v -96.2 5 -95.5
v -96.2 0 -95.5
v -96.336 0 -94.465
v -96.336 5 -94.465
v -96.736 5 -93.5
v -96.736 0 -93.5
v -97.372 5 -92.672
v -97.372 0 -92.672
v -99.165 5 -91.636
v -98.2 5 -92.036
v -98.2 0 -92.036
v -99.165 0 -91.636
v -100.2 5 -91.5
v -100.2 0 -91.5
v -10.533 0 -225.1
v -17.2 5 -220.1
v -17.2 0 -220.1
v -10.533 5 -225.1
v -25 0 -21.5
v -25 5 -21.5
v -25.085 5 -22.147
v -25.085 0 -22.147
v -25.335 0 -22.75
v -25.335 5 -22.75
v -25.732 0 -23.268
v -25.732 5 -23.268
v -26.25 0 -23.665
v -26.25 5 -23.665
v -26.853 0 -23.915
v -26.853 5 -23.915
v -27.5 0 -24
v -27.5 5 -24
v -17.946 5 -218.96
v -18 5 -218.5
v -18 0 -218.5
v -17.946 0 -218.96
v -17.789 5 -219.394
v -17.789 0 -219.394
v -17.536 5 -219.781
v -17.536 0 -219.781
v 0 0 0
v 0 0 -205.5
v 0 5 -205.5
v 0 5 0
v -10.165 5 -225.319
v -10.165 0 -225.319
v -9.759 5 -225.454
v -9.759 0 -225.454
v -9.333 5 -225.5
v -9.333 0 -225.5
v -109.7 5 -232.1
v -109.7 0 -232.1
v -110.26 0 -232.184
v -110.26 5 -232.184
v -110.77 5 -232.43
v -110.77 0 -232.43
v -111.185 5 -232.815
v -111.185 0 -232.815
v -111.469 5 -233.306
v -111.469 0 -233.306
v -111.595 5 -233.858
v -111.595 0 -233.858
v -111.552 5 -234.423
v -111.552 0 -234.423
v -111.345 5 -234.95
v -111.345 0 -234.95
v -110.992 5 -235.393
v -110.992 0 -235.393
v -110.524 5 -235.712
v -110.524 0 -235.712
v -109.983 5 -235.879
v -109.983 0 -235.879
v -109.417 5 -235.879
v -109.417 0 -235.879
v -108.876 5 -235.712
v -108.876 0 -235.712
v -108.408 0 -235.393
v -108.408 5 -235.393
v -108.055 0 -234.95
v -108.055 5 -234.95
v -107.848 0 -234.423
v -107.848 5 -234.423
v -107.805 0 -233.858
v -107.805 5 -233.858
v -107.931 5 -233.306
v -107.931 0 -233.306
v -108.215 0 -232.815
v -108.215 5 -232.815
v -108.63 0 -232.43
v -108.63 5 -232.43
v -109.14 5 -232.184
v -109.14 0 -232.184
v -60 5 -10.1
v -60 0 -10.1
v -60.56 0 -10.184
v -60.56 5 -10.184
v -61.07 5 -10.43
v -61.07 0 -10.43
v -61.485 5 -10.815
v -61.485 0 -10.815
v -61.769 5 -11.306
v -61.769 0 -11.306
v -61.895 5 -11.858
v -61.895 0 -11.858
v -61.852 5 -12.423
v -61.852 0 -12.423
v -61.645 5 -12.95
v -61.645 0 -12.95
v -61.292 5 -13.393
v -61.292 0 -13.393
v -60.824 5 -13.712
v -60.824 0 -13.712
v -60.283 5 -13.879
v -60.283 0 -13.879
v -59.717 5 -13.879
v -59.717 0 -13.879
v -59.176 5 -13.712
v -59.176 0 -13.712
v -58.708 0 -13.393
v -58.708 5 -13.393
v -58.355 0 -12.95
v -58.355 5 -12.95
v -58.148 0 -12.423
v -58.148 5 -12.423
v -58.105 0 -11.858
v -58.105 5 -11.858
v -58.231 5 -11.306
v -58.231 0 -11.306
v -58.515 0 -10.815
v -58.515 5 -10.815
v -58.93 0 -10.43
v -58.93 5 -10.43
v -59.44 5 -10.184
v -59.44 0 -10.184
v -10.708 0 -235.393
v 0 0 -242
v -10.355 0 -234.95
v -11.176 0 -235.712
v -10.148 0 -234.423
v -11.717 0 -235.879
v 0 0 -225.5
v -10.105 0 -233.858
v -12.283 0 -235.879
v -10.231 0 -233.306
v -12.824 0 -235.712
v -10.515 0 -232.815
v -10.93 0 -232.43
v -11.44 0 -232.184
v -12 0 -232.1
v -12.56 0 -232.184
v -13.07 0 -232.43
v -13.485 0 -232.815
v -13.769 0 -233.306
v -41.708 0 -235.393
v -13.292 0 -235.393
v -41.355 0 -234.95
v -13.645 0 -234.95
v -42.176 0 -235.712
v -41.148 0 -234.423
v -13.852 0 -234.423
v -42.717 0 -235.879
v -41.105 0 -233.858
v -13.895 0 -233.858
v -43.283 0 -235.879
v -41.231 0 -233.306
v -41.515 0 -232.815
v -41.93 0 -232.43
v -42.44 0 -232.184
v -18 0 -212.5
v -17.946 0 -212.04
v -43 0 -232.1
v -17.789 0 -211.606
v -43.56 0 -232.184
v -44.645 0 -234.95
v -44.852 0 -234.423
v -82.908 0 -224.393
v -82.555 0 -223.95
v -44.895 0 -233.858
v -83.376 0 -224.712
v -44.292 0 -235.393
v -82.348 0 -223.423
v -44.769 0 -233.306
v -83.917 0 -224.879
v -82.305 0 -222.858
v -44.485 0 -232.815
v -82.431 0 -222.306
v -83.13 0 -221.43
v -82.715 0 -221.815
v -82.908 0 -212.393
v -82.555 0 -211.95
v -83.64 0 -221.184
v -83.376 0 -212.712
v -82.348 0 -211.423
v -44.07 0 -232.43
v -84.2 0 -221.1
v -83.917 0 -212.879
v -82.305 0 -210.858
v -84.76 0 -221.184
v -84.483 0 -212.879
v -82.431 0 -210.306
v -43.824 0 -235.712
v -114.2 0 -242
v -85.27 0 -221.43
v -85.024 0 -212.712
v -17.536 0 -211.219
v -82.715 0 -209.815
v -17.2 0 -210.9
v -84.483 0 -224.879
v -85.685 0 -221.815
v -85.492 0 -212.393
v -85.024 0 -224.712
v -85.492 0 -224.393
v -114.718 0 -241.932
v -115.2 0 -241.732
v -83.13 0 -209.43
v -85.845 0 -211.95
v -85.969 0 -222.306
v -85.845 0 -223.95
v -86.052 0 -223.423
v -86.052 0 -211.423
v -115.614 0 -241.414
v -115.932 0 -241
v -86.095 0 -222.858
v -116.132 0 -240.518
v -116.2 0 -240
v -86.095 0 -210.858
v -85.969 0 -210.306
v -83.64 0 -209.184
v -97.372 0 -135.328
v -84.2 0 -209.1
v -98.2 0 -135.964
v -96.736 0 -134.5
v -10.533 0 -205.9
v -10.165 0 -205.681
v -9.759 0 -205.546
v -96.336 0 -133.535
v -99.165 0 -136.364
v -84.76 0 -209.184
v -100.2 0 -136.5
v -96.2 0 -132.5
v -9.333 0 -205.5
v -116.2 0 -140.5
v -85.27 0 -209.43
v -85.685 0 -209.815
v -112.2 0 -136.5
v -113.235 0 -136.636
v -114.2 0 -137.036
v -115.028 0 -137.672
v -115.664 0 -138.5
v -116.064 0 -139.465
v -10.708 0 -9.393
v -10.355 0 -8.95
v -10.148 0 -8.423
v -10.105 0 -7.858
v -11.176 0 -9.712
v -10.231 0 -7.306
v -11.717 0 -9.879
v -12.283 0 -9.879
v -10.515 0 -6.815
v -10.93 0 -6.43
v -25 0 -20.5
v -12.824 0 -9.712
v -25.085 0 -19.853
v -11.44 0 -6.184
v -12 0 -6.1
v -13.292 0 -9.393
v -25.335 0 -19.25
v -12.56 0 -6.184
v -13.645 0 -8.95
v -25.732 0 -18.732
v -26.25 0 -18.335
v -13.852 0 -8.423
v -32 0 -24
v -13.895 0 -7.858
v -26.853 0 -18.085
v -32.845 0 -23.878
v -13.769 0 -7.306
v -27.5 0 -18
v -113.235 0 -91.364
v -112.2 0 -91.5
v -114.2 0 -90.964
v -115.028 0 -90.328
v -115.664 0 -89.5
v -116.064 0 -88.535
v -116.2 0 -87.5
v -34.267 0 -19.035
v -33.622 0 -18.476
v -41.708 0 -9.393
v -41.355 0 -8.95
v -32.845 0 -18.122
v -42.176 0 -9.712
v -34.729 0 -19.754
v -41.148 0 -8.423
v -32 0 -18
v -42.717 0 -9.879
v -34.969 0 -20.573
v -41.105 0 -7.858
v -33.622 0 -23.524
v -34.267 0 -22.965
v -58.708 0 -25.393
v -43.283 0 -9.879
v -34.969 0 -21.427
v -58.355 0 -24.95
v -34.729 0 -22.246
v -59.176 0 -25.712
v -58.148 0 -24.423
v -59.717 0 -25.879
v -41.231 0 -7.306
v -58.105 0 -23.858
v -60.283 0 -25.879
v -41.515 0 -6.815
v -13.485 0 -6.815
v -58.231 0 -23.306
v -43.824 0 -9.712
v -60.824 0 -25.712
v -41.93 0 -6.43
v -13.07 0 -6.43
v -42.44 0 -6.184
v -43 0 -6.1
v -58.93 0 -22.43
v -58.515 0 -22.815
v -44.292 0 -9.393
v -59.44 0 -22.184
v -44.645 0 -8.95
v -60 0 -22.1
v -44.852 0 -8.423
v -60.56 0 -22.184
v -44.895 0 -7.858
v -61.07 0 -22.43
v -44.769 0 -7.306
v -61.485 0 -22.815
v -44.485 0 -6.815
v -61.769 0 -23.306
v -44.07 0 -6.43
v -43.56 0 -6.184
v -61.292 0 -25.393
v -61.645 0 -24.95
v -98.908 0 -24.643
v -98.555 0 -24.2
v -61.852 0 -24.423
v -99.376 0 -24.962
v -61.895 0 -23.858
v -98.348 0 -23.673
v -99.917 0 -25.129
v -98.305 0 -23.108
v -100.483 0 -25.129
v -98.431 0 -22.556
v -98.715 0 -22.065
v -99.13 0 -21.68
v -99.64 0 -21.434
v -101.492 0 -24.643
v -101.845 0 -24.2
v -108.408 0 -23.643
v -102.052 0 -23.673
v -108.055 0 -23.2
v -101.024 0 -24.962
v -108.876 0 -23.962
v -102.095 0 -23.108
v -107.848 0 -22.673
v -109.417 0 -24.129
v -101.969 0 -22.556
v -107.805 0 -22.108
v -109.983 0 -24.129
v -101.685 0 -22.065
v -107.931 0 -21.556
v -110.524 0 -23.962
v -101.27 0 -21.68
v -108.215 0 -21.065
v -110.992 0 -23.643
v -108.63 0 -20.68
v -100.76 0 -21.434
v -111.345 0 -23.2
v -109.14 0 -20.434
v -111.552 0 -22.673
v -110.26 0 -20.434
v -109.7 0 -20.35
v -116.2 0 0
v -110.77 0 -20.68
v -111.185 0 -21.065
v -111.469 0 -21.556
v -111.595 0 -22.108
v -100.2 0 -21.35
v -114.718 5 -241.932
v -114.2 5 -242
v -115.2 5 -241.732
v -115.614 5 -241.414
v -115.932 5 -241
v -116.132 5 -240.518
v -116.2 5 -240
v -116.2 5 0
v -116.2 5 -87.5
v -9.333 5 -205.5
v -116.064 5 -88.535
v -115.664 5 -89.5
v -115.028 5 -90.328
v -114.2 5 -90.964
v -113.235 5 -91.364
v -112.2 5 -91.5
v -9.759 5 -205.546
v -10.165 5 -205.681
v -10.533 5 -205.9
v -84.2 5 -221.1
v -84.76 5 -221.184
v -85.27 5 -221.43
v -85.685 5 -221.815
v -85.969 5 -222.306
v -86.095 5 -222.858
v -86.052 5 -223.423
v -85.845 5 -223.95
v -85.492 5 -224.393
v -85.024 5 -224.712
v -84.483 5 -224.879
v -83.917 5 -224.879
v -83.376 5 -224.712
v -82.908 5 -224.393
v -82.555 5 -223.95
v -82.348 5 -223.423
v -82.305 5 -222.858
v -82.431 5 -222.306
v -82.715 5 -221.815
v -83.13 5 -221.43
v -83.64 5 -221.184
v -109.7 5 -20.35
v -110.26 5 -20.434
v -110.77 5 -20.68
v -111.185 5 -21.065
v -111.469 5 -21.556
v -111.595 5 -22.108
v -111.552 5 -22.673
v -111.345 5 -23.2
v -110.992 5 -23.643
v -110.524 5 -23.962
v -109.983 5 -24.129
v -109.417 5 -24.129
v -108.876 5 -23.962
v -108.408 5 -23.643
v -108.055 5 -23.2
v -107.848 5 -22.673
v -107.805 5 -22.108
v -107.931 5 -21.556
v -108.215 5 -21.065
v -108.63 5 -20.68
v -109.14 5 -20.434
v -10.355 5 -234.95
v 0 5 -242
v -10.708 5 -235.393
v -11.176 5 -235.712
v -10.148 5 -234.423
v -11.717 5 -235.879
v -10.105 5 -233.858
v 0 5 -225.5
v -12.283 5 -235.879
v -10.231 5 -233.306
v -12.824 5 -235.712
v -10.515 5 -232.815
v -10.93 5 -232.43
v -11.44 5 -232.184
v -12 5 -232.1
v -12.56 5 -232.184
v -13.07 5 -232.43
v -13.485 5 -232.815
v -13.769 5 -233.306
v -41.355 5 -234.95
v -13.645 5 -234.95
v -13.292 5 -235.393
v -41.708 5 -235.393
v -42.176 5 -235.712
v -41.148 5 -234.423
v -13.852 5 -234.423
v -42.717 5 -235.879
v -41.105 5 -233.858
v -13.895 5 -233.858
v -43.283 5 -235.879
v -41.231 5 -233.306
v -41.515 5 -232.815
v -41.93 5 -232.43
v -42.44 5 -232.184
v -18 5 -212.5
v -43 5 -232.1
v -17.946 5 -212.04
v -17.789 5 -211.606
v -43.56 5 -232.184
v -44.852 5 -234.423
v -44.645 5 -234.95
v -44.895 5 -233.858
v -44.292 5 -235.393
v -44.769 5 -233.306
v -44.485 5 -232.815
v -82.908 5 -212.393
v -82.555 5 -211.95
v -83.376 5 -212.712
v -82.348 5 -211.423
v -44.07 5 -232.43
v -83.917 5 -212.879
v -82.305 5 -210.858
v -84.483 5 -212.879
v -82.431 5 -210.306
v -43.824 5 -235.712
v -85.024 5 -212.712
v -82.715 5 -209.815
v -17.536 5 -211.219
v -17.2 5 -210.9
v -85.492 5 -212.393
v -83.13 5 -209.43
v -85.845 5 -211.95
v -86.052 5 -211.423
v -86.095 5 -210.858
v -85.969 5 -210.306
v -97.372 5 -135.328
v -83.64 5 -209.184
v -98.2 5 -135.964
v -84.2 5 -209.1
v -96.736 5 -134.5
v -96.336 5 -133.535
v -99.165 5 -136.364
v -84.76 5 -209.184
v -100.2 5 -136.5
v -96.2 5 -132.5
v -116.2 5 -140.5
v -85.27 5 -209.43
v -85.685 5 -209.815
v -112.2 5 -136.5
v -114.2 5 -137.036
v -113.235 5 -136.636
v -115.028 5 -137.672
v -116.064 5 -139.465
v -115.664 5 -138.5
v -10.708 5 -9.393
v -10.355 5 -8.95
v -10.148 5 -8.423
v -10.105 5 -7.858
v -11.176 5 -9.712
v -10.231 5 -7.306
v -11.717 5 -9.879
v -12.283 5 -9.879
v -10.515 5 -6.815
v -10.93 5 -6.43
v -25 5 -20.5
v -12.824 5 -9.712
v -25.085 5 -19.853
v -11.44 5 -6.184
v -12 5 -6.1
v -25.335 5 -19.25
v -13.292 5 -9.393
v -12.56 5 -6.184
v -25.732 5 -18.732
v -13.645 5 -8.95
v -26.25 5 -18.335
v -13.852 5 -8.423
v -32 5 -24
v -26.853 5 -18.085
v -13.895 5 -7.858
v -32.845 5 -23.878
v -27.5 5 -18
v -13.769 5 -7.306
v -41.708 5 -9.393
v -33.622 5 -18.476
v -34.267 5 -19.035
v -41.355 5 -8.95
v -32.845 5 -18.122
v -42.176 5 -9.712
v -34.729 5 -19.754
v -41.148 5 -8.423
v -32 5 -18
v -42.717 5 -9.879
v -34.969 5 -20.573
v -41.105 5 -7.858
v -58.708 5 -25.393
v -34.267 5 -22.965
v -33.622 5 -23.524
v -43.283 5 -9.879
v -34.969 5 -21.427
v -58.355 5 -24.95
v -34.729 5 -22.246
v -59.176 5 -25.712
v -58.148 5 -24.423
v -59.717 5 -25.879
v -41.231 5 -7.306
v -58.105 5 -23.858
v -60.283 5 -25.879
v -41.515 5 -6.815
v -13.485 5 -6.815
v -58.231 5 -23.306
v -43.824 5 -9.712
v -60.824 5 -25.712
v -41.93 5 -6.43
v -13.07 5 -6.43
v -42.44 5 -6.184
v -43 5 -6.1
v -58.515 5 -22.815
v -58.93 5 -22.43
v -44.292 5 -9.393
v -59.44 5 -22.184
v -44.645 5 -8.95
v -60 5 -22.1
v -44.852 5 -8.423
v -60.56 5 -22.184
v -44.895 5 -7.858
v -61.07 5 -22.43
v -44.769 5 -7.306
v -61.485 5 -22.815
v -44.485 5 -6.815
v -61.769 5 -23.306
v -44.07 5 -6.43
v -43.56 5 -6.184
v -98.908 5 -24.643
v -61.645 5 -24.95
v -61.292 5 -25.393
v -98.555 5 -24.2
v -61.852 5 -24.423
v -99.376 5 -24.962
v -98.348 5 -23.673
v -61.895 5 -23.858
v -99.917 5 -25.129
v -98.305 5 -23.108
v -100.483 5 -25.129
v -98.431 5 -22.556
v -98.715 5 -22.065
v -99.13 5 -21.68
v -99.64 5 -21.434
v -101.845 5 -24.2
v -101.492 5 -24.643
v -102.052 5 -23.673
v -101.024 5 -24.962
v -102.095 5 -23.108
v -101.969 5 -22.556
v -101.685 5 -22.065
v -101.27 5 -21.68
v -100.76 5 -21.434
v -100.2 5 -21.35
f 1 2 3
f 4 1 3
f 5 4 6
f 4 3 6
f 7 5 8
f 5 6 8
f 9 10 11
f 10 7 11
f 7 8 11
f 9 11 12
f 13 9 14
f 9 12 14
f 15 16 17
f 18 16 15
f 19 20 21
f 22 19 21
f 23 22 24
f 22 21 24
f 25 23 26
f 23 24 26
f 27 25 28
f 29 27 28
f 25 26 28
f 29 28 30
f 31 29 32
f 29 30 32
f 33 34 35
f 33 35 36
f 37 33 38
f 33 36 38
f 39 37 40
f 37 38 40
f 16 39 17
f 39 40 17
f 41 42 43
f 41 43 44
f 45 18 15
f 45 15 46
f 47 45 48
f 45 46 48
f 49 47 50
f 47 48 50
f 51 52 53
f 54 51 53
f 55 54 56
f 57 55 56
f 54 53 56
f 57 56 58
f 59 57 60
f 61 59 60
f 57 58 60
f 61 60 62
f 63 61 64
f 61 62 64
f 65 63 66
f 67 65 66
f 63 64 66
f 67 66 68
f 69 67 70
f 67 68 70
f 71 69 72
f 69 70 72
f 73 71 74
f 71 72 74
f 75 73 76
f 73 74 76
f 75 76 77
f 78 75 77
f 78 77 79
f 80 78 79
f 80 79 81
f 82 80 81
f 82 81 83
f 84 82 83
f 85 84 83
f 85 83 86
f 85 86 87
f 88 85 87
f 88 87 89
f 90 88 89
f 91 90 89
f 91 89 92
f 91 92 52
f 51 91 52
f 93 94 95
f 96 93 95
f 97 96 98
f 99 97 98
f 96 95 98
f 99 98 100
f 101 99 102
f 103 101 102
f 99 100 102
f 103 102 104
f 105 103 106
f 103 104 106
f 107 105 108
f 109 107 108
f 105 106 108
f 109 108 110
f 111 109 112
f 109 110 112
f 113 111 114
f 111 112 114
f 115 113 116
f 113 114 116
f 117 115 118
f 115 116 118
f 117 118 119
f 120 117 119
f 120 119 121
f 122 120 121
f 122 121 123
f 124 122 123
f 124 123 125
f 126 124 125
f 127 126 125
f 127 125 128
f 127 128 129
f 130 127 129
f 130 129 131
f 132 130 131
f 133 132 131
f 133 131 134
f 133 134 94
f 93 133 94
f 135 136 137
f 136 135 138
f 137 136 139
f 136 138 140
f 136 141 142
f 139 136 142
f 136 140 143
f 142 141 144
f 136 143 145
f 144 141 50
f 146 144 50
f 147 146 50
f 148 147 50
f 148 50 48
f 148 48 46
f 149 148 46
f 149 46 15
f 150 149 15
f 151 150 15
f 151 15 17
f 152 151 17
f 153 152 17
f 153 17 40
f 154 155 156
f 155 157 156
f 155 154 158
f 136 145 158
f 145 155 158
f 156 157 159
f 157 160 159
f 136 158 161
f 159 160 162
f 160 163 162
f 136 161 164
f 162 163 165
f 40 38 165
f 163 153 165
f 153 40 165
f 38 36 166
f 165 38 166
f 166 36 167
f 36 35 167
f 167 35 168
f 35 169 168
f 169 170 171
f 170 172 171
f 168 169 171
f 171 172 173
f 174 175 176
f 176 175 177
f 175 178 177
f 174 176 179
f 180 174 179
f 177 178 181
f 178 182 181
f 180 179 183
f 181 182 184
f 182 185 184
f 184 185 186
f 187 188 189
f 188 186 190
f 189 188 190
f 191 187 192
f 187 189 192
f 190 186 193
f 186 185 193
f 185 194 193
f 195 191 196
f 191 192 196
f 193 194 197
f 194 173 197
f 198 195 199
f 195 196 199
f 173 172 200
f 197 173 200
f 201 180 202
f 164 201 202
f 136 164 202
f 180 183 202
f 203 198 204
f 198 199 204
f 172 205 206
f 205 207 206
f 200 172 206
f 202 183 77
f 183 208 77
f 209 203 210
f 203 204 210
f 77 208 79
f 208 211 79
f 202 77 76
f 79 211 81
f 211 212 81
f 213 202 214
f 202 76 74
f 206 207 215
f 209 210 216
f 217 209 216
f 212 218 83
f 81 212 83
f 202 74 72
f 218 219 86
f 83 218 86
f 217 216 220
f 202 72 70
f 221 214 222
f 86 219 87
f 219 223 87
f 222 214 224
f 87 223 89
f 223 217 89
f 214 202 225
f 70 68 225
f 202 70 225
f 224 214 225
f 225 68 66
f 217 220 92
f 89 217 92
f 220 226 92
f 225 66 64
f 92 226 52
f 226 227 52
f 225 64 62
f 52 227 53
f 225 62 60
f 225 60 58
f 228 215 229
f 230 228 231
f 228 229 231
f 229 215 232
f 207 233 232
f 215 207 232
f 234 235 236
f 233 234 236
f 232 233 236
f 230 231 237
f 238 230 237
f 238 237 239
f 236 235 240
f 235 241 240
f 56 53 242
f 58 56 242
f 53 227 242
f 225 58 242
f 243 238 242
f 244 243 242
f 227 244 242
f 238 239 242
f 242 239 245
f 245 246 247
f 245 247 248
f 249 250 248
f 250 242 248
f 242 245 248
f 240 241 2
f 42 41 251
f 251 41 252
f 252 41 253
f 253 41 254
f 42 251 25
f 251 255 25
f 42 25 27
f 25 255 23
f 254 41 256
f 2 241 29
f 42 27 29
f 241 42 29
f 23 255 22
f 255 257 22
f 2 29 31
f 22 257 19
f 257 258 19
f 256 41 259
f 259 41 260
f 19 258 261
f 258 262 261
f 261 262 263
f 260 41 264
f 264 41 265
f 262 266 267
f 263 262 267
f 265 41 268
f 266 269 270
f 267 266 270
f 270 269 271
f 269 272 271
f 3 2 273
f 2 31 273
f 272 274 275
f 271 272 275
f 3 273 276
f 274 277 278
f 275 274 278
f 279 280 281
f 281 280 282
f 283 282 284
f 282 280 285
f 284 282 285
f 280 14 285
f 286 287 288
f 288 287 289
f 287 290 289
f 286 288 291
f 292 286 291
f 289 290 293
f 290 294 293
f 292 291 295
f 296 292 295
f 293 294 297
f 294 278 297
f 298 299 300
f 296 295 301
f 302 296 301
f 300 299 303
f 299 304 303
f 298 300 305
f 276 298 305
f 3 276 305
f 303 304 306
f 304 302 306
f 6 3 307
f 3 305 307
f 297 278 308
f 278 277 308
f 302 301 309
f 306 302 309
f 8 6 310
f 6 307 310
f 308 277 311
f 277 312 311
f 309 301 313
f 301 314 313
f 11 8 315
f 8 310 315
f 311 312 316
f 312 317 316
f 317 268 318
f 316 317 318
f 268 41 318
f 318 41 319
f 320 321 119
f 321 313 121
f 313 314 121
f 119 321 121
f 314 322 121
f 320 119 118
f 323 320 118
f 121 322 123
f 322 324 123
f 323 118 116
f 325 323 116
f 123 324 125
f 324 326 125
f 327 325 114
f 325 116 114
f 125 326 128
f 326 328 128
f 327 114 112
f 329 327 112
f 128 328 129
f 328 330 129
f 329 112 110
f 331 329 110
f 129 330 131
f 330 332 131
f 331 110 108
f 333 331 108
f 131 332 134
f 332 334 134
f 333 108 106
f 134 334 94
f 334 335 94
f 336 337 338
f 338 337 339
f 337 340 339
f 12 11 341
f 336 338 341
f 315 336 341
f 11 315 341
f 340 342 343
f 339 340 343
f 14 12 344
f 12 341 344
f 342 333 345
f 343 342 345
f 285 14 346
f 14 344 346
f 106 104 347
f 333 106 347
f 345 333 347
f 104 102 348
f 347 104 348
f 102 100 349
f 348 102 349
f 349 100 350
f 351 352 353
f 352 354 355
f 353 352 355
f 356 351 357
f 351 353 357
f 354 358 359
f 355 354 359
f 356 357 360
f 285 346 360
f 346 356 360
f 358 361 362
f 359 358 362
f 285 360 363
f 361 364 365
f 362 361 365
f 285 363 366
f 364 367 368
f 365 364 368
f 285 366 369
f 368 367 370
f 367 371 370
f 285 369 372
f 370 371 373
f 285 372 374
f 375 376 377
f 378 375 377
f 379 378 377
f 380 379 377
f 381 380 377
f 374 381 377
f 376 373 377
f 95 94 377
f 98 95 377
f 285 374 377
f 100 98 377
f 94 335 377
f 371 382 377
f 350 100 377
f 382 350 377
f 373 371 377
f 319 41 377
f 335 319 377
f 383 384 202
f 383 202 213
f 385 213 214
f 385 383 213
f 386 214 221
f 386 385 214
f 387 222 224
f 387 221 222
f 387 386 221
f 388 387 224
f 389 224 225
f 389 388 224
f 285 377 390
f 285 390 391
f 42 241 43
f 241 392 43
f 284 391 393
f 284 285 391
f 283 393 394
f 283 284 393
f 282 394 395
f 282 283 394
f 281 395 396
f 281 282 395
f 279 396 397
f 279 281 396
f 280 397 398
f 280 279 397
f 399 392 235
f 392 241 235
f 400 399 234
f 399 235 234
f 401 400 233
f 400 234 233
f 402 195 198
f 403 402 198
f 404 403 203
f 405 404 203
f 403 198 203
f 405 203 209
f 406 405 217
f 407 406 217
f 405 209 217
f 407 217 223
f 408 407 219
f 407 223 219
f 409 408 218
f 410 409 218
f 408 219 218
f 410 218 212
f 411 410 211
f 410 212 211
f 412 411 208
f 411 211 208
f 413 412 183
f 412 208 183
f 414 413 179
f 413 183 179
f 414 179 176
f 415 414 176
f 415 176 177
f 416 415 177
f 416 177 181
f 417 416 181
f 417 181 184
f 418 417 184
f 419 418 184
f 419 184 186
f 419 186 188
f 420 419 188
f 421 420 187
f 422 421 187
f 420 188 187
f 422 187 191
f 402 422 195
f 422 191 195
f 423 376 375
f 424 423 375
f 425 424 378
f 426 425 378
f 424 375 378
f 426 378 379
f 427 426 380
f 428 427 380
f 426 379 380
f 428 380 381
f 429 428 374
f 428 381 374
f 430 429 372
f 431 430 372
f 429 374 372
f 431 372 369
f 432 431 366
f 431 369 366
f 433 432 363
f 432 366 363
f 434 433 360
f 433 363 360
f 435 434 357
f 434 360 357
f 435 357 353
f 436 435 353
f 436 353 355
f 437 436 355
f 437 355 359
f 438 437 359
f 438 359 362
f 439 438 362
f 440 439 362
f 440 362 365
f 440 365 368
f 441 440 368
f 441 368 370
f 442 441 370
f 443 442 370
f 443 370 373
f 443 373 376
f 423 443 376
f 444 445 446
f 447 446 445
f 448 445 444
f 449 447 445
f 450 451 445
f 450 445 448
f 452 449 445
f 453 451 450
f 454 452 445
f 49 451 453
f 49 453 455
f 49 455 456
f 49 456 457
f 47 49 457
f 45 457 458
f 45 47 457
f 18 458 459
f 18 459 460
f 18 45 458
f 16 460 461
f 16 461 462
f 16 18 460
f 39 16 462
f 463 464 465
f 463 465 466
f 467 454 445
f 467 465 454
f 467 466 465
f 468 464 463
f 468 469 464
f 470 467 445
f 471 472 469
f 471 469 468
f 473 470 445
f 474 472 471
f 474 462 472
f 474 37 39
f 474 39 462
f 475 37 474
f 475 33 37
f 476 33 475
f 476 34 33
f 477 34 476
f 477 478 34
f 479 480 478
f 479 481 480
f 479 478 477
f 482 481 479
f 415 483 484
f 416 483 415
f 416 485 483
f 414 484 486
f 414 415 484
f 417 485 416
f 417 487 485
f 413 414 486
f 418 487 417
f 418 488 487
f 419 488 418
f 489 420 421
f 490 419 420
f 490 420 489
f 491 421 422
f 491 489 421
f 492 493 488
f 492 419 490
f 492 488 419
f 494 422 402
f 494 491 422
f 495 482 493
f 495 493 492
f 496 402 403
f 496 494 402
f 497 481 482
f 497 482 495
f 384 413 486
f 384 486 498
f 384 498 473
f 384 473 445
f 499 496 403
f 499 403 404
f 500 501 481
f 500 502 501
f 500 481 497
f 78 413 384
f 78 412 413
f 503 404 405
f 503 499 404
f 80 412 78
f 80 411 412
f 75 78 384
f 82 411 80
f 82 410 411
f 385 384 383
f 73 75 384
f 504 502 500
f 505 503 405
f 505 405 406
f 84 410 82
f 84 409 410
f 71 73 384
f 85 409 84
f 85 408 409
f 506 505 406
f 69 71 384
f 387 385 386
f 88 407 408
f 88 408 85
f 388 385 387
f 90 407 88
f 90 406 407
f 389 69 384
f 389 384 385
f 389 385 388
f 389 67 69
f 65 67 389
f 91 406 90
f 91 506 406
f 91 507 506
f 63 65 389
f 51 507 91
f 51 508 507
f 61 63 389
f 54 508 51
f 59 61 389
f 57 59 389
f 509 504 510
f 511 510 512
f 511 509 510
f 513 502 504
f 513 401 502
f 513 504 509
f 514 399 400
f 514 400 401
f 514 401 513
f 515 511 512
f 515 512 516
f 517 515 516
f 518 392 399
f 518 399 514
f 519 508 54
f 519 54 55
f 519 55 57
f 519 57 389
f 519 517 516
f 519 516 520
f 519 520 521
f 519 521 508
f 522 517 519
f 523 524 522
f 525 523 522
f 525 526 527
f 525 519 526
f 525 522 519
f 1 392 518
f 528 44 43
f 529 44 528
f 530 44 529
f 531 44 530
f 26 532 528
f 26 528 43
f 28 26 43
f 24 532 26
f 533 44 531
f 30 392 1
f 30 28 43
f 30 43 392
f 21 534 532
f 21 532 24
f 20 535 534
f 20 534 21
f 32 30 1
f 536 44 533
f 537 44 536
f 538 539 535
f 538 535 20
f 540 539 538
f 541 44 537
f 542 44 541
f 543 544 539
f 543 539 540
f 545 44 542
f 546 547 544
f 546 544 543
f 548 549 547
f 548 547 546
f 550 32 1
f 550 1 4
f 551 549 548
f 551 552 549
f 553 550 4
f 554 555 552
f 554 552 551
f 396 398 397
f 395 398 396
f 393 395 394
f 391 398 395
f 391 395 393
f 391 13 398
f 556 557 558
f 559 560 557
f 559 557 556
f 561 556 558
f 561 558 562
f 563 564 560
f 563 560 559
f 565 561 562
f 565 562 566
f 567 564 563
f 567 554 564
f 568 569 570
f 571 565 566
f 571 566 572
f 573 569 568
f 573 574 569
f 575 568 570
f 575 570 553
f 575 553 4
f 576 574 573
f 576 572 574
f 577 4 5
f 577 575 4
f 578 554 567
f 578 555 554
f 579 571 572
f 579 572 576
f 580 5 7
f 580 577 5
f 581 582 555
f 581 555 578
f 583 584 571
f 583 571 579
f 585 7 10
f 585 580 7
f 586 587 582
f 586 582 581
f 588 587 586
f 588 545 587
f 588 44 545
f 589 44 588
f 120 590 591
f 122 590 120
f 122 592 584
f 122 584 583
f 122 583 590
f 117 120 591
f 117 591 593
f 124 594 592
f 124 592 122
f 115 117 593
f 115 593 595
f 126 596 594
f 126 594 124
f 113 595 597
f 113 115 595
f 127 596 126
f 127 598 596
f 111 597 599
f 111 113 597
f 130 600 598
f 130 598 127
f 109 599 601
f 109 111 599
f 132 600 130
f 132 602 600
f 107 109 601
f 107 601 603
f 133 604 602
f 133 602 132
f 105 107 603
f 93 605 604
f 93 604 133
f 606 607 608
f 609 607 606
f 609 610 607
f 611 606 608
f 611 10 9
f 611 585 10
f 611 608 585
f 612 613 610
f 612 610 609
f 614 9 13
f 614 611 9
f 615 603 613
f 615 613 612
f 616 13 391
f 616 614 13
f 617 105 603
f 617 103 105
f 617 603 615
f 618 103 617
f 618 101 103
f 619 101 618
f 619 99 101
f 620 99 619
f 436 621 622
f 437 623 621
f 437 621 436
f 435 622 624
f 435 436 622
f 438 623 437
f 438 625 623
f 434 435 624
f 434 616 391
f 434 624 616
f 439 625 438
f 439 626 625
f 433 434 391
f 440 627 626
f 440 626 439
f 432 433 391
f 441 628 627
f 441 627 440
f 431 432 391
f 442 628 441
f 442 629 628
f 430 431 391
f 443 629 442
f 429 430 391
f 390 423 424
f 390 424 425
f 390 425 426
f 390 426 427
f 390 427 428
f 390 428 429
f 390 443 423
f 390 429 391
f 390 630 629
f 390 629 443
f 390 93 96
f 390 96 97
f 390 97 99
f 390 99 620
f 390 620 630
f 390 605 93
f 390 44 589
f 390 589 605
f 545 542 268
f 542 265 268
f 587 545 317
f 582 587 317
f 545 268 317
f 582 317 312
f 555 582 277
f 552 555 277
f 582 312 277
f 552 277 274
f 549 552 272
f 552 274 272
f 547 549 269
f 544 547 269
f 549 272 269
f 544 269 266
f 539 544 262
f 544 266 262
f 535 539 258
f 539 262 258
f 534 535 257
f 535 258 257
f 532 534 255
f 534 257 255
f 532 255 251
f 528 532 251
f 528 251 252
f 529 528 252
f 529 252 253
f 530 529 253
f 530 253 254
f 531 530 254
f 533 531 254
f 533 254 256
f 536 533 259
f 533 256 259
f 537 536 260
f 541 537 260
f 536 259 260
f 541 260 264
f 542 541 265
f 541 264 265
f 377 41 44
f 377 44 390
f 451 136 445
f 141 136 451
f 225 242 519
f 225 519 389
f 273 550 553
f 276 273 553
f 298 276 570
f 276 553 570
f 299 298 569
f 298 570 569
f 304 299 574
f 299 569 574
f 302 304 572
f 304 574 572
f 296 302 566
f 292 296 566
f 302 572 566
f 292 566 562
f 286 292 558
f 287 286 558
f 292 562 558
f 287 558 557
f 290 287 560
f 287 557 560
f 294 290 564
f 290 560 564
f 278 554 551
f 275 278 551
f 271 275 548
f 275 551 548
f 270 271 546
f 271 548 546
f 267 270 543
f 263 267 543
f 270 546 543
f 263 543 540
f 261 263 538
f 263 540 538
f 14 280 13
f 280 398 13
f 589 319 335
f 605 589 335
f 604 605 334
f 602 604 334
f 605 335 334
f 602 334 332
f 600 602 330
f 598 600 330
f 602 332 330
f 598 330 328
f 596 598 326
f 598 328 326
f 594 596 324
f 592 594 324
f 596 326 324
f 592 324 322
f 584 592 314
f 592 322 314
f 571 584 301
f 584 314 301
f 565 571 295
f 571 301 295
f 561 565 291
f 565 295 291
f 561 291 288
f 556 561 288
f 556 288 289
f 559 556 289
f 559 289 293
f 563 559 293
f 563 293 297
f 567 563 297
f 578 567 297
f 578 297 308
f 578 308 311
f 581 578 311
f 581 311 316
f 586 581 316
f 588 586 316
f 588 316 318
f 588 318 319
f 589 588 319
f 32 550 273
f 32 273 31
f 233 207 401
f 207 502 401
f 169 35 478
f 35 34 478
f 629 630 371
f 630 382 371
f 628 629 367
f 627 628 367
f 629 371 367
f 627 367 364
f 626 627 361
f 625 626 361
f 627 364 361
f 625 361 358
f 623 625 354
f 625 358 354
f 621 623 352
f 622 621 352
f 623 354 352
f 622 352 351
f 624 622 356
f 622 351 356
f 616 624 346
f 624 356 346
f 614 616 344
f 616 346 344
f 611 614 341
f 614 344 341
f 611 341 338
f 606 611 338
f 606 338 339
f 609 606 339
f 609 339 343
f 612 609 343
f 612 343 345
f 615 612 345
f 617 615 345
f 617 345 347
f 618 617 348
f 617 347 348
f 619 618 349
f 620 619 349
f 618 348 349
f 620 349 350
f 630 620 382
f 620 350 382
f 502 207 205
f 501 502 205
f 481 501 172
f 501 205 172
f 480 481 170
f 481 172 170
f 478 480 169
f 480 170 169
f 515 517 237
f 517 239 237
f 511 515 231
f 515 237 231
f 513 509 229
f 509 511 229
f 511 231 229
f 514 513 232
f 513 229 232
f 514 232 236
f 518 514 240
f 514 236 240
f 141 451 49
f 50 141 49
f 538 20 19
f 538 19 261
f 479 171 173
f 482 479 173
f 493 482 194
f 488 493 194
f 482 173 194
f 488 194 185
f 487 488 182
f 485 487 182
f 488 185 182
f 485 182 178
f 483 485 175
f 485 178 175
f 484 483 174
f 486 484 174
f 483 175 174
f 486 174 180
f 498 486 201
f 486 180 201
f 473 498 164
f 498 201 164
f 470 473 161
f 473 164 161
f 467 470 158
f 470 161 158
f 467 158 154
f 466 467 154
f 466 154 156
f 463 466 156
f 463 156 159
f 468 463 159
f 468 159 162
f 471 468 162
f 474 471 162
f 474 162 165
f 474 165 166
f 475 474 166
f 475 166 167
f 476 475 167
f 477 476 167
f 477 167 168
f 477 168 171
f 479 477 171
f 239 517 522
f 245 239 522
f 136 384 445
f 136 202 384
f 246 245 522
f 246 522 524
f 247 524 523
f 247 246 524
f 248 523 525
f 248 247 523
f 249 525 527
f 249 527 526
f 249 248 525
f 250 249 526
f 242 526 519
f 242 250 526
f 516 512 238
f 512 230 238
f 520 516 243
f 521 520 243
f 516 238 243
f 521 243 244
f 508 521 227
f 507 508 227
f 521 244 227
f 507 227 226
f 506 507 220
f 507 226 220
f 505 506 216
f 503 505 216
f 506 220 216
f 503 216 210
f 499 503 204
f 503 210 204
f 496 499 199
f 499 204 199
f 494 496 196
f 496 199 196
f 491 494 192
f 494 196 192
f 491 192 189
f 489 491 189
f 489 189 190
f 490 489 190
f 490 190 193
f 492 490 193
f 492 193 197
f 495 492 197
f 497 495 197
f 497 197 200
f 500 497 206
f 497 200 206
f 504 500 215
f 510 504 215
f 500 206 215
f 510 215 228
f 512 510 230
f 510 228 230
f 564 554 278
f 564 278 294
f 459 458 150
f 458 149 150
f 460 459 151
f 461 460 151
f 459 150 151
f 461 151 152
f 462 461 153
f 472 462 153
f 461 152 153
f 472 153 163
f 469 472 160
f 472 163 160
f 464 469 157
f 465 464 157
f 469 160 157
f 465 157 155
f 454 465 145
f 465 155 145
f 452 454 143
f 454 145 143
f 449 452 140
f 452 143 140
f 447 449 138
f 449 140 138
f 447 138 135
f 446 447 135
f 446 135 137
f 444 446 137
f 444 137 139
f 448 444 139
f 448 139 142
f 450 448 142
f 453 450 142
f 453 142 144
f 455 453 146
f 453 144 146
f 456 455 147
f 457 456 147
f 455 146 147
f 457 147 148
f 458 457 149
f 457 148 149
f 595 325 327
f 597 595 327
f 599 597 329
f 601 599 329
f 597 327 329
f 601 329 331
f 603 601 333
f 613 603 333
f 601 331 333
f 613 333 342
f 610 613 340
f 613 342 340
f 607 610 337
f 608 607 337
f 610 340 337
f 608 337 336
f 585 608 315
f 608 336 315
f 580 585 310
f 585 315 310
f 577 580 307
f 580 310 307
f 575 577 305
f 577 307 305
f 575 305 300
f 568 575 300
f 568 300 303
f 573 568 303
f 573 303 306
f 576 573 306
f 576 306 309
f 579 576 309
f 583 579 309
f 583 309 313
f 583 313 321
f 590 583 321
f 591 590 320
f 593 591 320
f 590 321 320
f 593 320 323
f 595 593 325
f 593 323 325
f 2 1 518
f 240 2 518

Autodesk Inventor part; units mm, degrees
ref_plane "YZ Plane" through (0, 0, 0) normal (1, 0, 0) x (0, 1, 0)
ref_plane "XZ Plane" through (0, 0, 0) normal (0, 1, 0) x (-1, 0, 0)
ref_plane "XY Plane" through (0, 0, 0) normal (0, 0, 1) x (1, 0, 0)
sketch "Sketch1" plane through (0, 0, 0) normal (0, 1, 0) x (-1, 0, 0)
  line L0 (0, 0) -> (116.2, 0)
  line L1 (116.2, 0) -> (116.2, -242)
  line L2 (116.2, -242) -> (0, -242)
  line L3 (0, -242) -> (0, 0)
  dimension "d0" = 116.2
  dimension "d1" = 242
extrude "Extrusion1" add sketch "Sketch1" along normal blind 5
sketch "Sketch2" plane through (0, 5, 0) normal (0, 1, 0) x (1, 0, 0)
  line L0 (-43, 8) -> (-12, 8) construction
  line L1 (-12, 8) -> (-12, 234) construction
  line L2 (-12, 234) -> (-43, 234) construction
  line L3 (-43, 234) -> (-43, 8) construction
  line L4 (-116.2, 0) -> (0, 0) construction
  line L5 (0, 242) -> (-116.2, 242) construction
  line L6 (0, 0) -> (0, 242) construction
  dimension "d4" = 8
  dimension "d5" = 8
  dimension "d6" = 12
  dimension "d7" = 31
hole "Hole1" at (-12, 5, -8) at (-43, 5, -8) at (-43, 5, -234) at (-12, 5, -234) direction (0, -1, 0) diameter 3.8 end through all
sketch "Sketch3" plane through (0, 5, 0) normal (0, 1, 0) x (1, 0, 0)
  line L0 (-128.5064, 215.5) -> (22.7754, 215.5) construction
  line L1 (0, 242) -> (-116.2, 242) projected
  line L2 (0, 225.5) -> (-18, 225.5)
  line L3 (-18, 225.5) -> (-18, 205.5)
  line L4 (-18, 205.5) -> (0, 205.5)
  line L5 (0, 205.5) -> (0, 225.5)
  line L6 (0, 225.5) -> (-18, 205.5) construction
  line L7 (-18, 225.5) -> (0, 205.5) construction
  line L8 (0, 0) -> (0, 242) projected
  line L9 (-18, 211.5) -> (-10, 205.5)
  line L10 (-18, 219.5) -> (-10, 225.5)
  point P0 (-9, 215.5)
  point P1 (-18, 215.5)
  dimension "d15" = 26.5
  dimension "d16" = 20
  dimension "d17" = 18
  dimension "d18" = 8
  dimension "d19" = 10
extrude "Extrusion2" cut sketch "Sketch3" against normal through all contours L5 L4 L9 L3 L10 L2
fillet "Fillet1" radius 2 4 edges at (-18, 2.5, -219.5) (-10, 2.5, -225.5) (-18, 2.5, -211.5) (-10, 2.5, -205.5)
sketch "Sketch4" plane through (0, 5, 0) normal (0, 1, 0) x (1, 0, 0)
  line L0 (-84.2, 269.0758) -> (-84.2, -69.3617) construction
  line L1 (0, 0) -> (0, 205.5) construction
  line L2 (-116.2, 0) -> (0, 0) construction
  line L3 (0, 242) -> (-116.2, 242) construction
  line L4 (-116.2, 242) -> (-116.2, 0) projected
  line L5 (-60, 78.142) -> (-60, -51.5949) construction
  point P0 (-84.2, 223)
  point P1 (-84.2, 211)
  point P2 (-60, 24)
  point P3 (-60, 12)
  dimension "d24" = 12
  dimension "d25" = 12
  dimension "d26" = 12
  dimension "d27" = 31
  dimension "d35" = 32
  dimension "d36" = 60
hole "Hole2" at (-84.2, 5, -223) at (-84.2, 5, -211) at (-60, 5, -24) at (-60, 5, -12) direction (0, -1, 0) diameter 3.8 end through all
sketch "Sketch5" plane through (0, 5, 0) normal (0, 1, 0) x (1, 0, 0)
  line L0 (-116.2, 242) -> (-116.2, 0) projected
  line L1 (-116.2, 0) -> (0, 0) projected
  point P0 (-100.2, 23.25)
  dimension "d37" = 16
  dimension "d38" = 23.25
hole "Hole3" at (-100.2, 5, -23.25) direction (0, -1, 0) diameter 3.8 end through all
sketch "Sketch6" plane through (0, 5, 0) normal (0, 1, 0) x (1, 0, 0)
  line L0 (-109.7, 280.0258) -> (-109.7, -41.1522) construction
  line L1 (-116.2, 242) -> (-116.2, 0) projected
  line L2 (0, 242) -> (-116.2, 242) projected
  point P0 (0, 0)
  point P1 (-109.7, 234)
  point P2 (-109.7, 22.25)
  dimension "d46" = 6.5
  dimension "d47" = 8
  dimension "d48" = 211.75
hole "Hole4" at (-109.7, 5, -234) at (-109.7, 5, -22.25) direction (0, -1, 0) diameter 3.8 end through all
sketch "Sketch7" plane through (0, 5, 0) normal (0, 1, 0) x (1, 0, 0)
  line L0 (-50.7253, 21) -> (31.7934, 21) construction
  line L1 (-116.2, 0) -> (0, 0) construction
  line L2 (-32, 24) -> (-27.5, 24)
  line L3 (-25, 21.5) -> (-25, 20.5)
  line L4 (-27.5, 18) -> (-32, 18)
  line L5 (-32, 18) -> (-32, 21)
  line L6 (-32, 24) -> (-25, 18) construction
  line L7 (-25, 24) -> (-32, 18) construction
  line L8 (0, 0) -> (0, 205.5) construction
  arc A0 (-32, 24) -> (-32, 18) centre (-32, 21) ccw
  arc A1 (-25, 21.5) -> (-27.5, 24) centre (-27.5, 21.5) ccw
  arc A2 (-27.5, 18) -> (-25, 20.5) centre (-27.5, 20.5) ccw
  point P0 (-28.5, 21)
  dimension "d56" = 21
  dimension "d57" = 7
  dimension "d58" = 6
  dimension "d59" = 25
  dimension "d62" = 2.5
extrude "Extrusion3" cut sketch "Sketch7" against normal blind 10
sketch "Sketch8" plane through (0, 5, 0) normal (0, 1, 0) x (1, 0, 0)
  line L0 (-195.7233, 114) -> (78.1714, 114) construction
  line L1 (-116.2, 0) -> (0, 0) projected
  line L2 (-136.2, 91.5) -> (-96.2, 91.5)
  line L3 (-96.2, 91.5) -> (-96.2, 136.5)
  line L4 (-96.2, 136.5) -> (-136.2, 136.5)
  line L5 (-136.2, 136.5) -> (-136.2, 91.5)
  line L6 (-116.2, 242) -> (-116.2, 0) projected
  line L7 (-136.2, 91.5) -> (-96.2, 136.5) construction
  line L8 (-96.2, 91.5) -> (-136.2, 136.5) construction
  point P0 (-116.2, 114)
  point P1 (-116.2, 136.5)
  point P2 (-116.2, 91.5)
  dimension "d63" = 114
  dimension "d64" = 40
  dimension "d65" = 45
extrude "Extrusion4" cut sketch "Sketch8" against normal through all contours L6 L4 L3 L2
fillet "Fillet2" radius 4 4 edges at (-116.2, 2.5, -136.5) (-116.2, 2.5, -91.5) (-96.2, 2.5, -91.5) (-96.2, 2.5, -136.5)
fillet "Fillet3" radius 2 1 edges at (-116.2, 2.5, -242)
properties part number "Battery Side Plate"
